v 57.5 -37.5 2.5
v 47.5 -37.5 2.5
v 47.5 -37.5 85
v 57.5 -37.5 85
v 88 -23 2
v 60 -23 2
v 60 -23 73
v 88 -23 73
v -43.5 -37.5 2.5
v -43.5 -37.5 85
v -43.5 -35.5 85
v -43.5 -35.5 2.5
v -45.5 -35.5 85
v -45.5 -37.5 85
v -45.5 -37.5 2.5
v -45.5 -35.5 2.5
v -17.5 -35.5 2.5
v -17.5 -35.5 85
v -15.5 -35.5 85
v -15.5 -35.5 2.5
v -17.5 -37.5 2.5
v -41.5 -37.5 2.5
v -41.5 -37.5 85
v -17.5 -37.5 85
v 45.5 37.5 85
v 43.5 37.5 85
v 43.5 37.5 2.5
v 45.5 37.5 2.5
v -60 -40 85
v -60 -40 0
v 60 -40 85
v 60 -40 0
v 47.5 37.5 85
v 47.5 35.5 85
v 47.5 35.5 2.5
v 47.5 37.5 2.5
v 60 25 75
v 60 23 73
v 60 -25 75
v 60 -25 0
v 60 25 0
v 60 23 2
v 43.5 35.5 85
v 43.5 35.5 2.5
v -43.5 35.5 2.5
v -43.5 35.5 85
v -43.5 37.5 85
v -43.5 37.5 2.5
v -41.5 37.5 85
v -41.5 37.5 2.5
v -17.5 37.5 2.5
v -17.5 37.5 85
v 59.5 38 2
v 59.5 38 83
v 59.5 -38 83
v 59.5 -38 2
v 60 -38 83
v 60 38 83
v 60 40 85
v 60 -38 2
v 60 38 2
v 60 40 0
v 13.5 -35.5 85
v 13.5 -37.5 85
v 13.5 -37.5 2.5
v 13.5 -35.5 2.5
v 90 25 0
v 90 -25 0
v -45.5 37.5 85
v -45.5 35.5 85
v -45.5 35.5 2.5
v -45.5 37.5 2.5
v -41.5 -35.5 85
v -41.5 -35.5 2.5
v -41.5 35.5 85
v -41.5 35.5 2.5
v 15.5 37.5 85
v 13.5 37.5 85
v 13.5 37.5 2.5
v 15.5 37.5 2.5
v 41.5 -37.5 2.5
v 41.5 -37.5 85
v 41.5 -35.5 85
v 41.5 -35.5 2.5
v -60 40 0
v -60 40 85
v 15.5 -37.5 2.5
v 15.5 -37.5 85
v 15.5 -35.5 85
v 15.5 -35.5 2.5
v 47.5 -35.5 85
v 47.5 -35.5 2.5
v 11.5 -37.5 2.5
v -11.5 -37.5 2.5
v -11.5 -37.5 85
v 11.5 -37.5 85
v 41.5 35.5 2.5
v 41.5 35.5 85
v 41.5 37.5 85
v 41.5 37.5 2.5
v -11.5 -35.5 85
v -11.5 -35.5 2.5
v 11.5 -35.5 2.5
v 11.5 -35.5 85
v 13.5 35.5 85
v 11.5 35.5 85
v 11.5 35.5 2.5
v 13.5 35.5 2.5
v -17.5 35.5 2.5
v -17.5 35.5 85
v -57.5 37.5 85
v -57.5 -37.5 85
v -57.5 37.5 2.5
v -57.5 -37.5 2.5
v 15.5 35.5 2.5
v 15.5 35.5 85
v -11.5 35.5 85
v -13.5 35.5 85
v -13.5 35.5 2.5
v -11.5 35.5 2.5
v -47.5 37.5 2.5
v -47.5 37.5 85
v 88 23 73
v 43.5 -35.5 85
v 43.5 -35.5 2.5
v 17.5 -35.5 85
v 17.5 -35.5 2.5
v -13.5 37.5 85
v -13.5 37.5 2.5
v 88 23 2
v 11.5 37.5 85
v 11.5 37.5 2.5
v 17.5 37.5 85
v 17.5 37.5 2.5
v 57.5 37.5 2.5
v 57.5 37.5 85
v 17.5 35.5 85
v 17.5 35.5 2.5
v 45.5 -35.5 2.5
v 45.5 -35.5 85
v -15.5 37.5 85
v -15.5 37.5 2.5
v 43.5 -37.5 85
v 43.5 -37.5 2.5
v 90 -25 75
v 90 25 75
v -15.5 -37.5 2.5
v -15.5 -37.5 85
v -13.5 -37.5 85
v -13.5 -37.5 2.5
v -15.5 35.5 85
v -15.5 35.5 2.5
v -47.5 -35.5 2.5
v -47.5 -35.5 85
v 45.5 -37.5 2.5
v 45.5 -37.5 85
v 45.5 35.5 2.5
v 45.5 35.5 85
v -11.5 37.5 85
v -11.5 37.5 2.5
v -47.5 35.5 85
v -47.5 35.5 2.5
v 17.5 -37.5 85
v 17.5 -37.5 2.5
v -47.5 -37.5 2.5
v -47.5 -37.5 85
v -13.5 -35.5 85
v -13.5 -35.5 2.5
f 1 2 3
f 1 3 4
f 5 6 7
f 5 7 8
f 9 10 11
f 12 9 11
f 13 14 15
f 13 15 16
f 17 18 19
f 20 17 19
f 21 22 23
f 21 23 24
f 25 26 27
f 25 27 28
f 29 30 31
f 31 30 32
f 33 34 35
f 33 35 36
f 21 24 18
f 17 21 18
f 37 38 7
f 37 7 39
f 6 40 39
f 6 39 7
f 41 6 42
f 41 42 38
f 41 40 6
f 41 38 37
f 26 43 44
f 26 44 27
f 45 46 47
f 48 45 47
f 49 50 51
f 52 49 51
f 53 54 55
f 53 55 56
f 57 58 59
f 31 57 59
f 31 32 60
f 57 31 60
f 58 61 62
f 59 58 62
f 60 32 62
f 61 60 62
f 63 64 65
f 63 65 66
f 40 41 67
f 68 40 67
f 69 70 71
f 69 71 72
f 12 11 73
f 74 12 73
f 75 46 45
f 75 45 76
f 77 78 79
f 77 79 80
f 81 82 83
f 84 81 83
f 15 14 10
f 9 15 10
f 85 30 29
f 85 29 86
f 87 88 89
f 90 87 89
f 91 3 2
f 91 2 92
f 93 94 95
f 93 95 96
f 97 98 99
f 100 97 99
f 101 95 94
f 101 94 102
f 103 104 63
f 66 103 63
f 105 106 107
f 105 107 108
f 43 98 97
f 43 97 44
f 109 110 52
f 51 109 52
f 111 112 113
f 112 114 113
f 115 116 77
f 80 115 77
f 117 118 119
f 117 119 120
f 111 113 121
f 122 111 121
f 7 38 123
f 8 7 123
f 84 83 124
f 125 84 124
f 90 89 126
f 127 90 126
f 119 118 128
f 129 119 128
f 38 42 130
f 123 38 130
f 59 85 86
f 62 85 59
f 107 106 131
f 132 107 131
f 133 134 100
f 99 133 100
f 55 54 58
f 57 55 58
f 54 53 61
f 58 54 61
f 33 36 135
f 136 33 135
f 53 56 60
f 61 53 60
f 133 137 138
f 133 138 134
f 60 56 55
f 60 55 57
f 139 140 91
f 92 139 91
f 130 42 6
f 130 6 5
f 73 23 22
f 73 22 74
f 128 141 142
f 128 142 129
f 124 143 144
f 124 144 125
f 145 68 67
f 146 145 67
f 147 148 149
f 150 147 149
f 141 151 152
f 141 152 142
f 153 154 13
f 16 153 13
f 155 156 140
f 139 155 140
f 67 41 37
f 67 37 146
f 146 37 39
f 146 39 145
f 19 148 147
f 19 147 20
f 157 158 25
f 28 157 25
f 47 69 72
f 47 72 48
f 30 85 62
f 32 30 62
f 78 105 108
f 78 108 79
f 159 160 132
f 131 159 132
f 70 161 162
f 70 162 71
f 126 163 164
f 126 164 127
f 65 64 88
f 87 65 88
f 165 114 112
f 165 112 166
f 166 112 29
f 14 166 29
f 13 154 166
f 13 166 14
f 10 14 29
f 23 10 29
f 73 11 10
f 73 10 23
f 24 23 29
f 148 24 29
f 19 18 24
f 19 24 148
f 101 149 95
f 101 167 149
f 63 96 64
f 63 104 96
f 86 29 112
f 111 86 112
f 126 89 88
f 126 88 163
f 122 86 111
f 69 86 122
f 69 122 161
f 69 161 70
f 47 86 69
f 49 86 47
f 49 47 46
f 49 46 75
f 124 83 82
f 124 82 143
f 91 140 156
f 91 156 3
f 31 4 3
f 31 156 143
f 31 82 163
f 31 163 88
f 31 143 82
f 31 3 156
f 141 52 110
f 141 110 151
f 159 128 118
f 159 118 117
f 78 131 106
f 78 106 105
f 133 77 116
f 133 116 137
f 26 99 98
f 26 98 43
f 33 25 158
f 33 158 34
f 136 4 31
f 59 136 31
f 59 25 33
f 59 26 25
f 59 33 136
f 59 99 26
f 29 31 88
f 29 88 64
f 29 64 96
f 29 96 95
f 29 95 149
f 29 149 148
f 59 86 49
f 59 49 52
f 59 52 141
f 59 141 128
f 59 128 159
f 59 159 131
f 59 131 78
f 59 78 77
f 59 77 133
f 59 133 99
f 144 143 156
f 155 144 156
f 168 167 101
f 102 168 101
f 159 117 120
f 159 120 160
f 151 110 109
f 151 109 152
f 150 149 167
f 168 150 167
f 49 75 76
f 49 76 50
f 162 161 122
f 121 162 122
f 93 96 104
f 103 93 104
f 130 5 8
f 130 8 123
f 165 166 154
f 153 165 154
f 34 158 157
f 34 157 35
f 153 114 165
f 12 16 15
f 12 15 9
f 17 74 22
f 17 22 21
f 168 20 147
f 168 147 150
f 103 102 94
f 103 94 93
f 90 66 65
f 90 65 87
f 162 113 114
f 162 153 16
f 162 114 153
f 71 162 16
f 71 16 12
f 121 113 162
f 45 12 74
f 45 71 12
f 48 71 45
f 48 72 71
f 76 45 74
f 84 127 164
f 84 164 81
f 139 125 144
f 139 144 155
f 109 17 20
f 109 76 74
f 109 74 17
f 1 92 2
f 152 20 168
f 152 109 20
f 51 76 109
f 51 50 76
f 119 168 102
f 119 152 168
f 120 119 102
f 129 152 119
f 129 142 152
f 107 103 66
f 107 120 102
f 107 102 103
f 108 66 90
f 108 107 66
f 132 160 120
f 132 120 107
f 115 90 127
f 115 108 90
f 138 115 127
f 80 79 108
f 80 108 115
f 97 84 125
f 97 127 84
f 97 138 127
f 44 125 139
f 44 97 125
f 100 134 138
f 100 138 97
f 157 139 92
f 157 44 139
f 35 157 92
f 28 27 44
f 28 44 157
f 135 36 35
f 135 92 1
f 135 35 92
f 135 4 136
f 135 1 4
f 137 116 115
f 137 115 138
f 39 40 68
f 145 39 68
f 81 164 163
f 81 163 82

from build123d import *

# Parameters (mm, degrees)
F0_W           = 120
F0_H           = 80
F1_DEPTH       = 85
F2_T           = -2.5
F3_W           = 2
F3_H           = 2
F4_DEPTH       = 85
F5_W           = 30
F5_H           = 50
F6_DEPTH       = 75
F7_T           = -2
F7_2_T         = 2
F7_2_T3_DEPTH  = 86.5
F7_2_T5_DEPTH  = 14
F7_2_T7_DEPTH  = 6
F7_2_T9_DEPTH  = 28
F7_2_T11_DEPTH = 6
F7_2_T13_DEPTH = 27
F7_2_T15_DEPTH = 6
F7_2_T17_DEPTH = 28
F7_2_T19_DEPTH = 6
F7_2_T21_DEPTH = 14
F7_2_T23_DEPTH = 79
F7_2_T25_DEPTH = 6
F7_2_T27_DEPTH = 6
F7_2_T29_DEPTH = 6
F7_2_T31_DEPTH = 6
F7_2_T33_DEPTH = 6
F7_2_T35_DEPTH = 6
F7_2_T37_DEPTH = 6
F7_2_T39_DEPTH = 6
F7_2_T41_DEPTH = 6
F7_2_T43_DEPTH = 6


# Not quite as in the source:
# - a shell that OpenCascade refuses in one call is made with other operations: the cavity is built on its own and cut out


with BuildPart() as f1:
    # F0 (on Top) → F1 (new body)
    with BuildSketch(Plane.XY):
        Rectangle(F0_W, F0_H)
    extrude(amount=F1_DEPTH)

    # F2
    f2_openings = [f1.faces().sort_by_distance(p)[0] for p in [
        (0, 0, 85),
    ]]
    offset(amount=F2_T, openings=f2_openings)

    # F3 (on Top) → F4 (join)
    with BuildSketch(Plane.XY):
        with Locations((-46.5, -36.5)):
            Rectangle(F3_W, F3_H)
        with Locations((-42.5, -36.5)):
            Rectangle(F3_W, F3_H)
        with Locations((-16.5, -36.5)):
            Rectangle(F3_W, F3_H)
        with Locations((-12.5, -36.5)):
            Rectangle(F3_W, F3_H)
        with Locations((42.5, -36.5)):
            Rectangle(F3_W, F3_H)
        with Locations((46.5, -36.5)):
            Rectangle(F3_W, F3_H)
        with Locations((12.5, -36.5)):
            Rectangle(F3_W, F3_H)
        with Locations((16.5, -36.5)):
            Rectangle(F3_W, F3_H)
        with Locations((-46.5, 36.5)):
            Rectangle(F3_W, F3_H)
        with Locations((42.5, 36.5)):
            Rectangle(F3_W, F3_H)
        with Locations((-16.5, 36.5)):
            Rectangle(F3_W, F3_H)
        with Locations((-42.5, 36.5)):
            Rectangle(F3_W, F3_H)
        with Locations((-12.5, 36.5)):
            Rectangle(F3_W, F3_H)
        with Locations((46.5, 36.5)):
            Rectangle(F3_W, F3_H)
        with Locations((16.5, 36.5)):
            Rectangle(F3_W, F3_H)
        with Locations((12.5, 36.5)):
            Rectangle(F3_W, F3_H)
    extrude(amount=F4_DEPTH)

    # F7#2: shell of thickness 2, made by hand


with BuildPart() as f6:
    # F5 (on Top) → F6 (new body)
    with BuildSketch(Plane.XY):
        with Locations((75, 0)):
            Rectangle(F5_W, F5_H)
    extrude(amount=F6_DEPTH)

    # F7
    f7_openings = [f6.faces().sort_by_distance(p)[0] for p in [
        (60, 0, 37.5),
    ]]
    offset(amount=F7_T, openings=f7_openings)


with BuildPart() as f7_2_core1:
    # F7_2_t2: copy of F1
    add(f1.part)

    # the walls: a layer under each face that stays
    f7_2_faces = [f7_2_core1.faces().sort_by_distance(p)[0] for p in [
        (0, -40, 42.5),
        (-60, 0, 42.5),
        (0, 0, 0),
        (-16, -37.3333333333, 85),
        (0, 40, 42.5),
        (-52.5, -37.5, 43.75),
        (-44.5, -37.5, 43.75),
        (-29.5, -37.5, 43.75),
        (-14.5, -37.5, 43.75),
        (0, -37.5, 43.75),
        (14.5, -37.5, 43.75),
        (29.5, -37.5, 43.75),
        (44.5, -37.5, 43.75),
        (52.5, -37.5, 43.75),
        (-57.5, 0, 43.75),
        (52.5, 37.5, 43.75),
        (44.5, 37.5, 43.75),
        (29.5, 37.5, 43.75),
        (14.5, 37.5, 43.75),
        (0, 37.5, 43.75),
        (-14.5, 37.5, 43.75),
        (-29.5, 37.5, 43.75),
        (-44.5, 37.5, 43.75),
        (-52.5, 37.5, 43.75),
        (57.5, 0, 43.75),
        (0, 0, 2.5),
        (-47.5, -36.5, 43.75),
        (-45.5, -36.5, 43.75),
        (-46.5, -35.5, 43.75),
        (-43.5, -36.5, 43.75),
        (-41.5, -36.5, 43.75),
        (-42.5, -35.5, 43.75),
        (-17.5, -36.5, 43.75),
        (-15.5, -36.5, 43.75),
        (-16.5, -35.5, 43.75),
        (-13.5, -36.5, 43.75),
        (-11.5, -36.5, 43.75),
        (-12.5, -35.5, 43.75),
        (11.5, -36.5, 43.75),
        (12.5, -35.5, 43.75),
        (13.5, -36.5, 43.75),
        (15.5, -36.5, 43.75),
        (17.5, -36.5, 43.75),
        (16.5, -35.5, 43.75),
        (41.5, -36.5, 43.75),
        (43.5, -36.5, 43.75),
        (42.5, -35.5, 43.75),
        (45.5, -36.5, 43.75),
        (47.5, -36.5, 43.75),
        (46.5, -35.5, 43.75),
        (47.5, 36.5, 43.75),
        (46.5, 35.5, 43.75),
        (45.5, 36.5, 43.75),
        (43.5, 36.5, 43.75),
        (42.5, 35.5, 43.75),
        (41.5, 36.5, 43.75),
        (17.5, 36.5, 43.75),
        (15.5, 36.5, 43.75),
        (16.5, 35.5, 43.75),
        (13.5, 36.5, 43.75),
        (11.5, 36.5, 43.75),
        (12.5, 35.5, 43.75),
        (-11.5, 36.5, 43.75),
        (-13.5, 36.5, 43.75),
        (-12.5, 35.5, 43.75),
        (-15.5, 36.5, 43.75),
        (-17.5, 36.5, 43.75),
        (-16.5, 35.5, 43.75),
        (-41.5, 36.5, 43.75),
        (-43.5, 36.5, 43.75),
        (-42.5, 35.5, 43.75),
        (-45.5, 36.5, 43.75),
        (-46.5, 35.5, 43.75),
        (-47.5, 36.5, 43.75),
    ]]
    thicken(f7_2_faces, amount=-F7_2_T, mode=Mode.SUBTRACT)

    # F7_2_s4 → F7_2_t3 (cut)
    with BuildSketch(Plane.XY.offset(0.5)):
        Polygon((-57.48, -37.48), (-57.5, -39.5), (-59.5, -39.5), (-59.5, -37.5), align=None)
        Polygon((-47.52, -37.48), (-47.5, -39.5), (-45.5, -39.5), (-45.5, -37.5), align=None)
        Polygon((-45.48, -37.48), (-45.5, -39.5), (-47.5, -39.5), (-47.5, -37.5), align=None)
        Polygon((-43.52, -37.48), (-43.5, -39.5), (-41.5, -39.5), (-41.5, -37.5), align=None)
        Polygon((-41.48, -37.48), (-41.5, -39.5), (-43.5, -39.5), (-43.5, -37.5), align=None)
        Polygon((-17.52, -37.48), (-17.5, -39.5), (-15.5, -39.5), (-15.5, -37.5), align=None)
        Polygon((-15.48, -37.48), (-15.5, -39.5), (-17.5, -39.5), (-17.5, -37.5), align=None)
        Polygon((-13.52, -37.48), (-13.5, -39.5), (-11.5, -39.5), (-11.5, -37.5), align=None)
        Polygon((-11.48, -37.48), (-11.5, -39.5), (-13.5, -39.5), (-13.5, -37.5), align=None)
        Polygon((11.48, -37.48), (11.5, -39.5), (13.5, -39.5), (13.5, -37.5), align=None)
        Polygon((13.52, -37.48), (13.5, -39.5), (11.5, -39.5), (11.5, -37.5), align=None)
        Polygon((15.48, -37.48), (15.5, -39.5), (17.5, -39.5), (17.5, -37.5), align=None)
        Polygon((17.52, -37.48), (17.5, -39.5), (15.5, -39.5), (15.5, -37.5), align=None)
        Polygon((41.48, -37.48), (41.5, -39.5), (43.5, -39.5), (43.5, -37.5), align=None)
        Polygon((43.52, -37.48), (43.5, -39.5), (41.5, -39.5), (41.5, -37.5), align=None)
        Polygon((45.48, -37.48), (45.5, -39.5), (47.5, -39.5), (47.5, -37.5), align=None)
        Polygon((47.52, -37.48), (47.5, -39.5), (45.5, -39.5), (45.5, -37.5), align=None)
        Polygon((57.48, -37.48), (57.5, -39.5), (59.5, -39.5), (59.5, -37.5), align=None)
        Polygon((-57.48, 37.48), (-59.5, 37.5), (-59.5, 39.5), (-57.5, 39.5), align=None)
        Polygon((57.48, 37.48), (57.5, 39.5), (59.5, 39.5), (59.5, 37.5), align=None)
        Polygon((47.52, 37.48), (47.5, 39.5), (45.5, 39.5), (45.5, 37.5), align=None)
        Polygon((45.48, 37.48), (45.5, 39.5), (47.5, 39.5), (47.5, 37.5), align=None)
        Polygon((43.52, 37.48), (43.5, 39.5), (41.5, 39.5), (41.5, 37.5), align=None)
        Polygon((41.48, 37.48), (41.5, 39.5), (43.5, 39.5), (43.5, 37.5), align=None)
        Polygon((17.52, 37.48), (17.5, 39.5), (15.5, 39.5), (15.5, 37.5), align=None)
        Polygon((15.48, 37.48), (15.5, 39.5), (17.5, 39.5), (17.5, 37.5), align=None)
        Polygon((13.52, 37.48), (13.5, 39.5), (11.5, 39.5), (11.5, 37.5), align=None)
        Polygon((11.48, 37.48), (11.5, 39.5), (13.5, 39.5), (13.5, 37.5), align=None)
        Polygon((-11.48, 37.48), (-11.5, 39.5), (-13.5, 39.5), (-13.5, 37.5), align=None)
        Polygon((-13.52, 37.48), (-13.5, 39.5), (-11.5, 39.5), (-11.5, 37.5), align=None)
        Polygon((-15.48, 37.48), (-15.5, 39.5), (-17.5, 39.5), (-17.5, 37.5), align=None)
        Polygon((-17.52, 37.48), (-17.5, 39.5), (-15.5, 39.5), (-15.5, 37.5), align=None)
        Polygon((-41.48, 37.48), (-41.5, 39.5), (-43.5, 39.5), (-43.5, 37.5), align=None)
        Polygon((-43.52, 37.48), (-43.5, 39.5), (-41.5, 39.5), (-41.5, 37.5), align=None)
        Polygon((-45.48, 37.48), (-45.5, 39.5), (-47.5, 39.5), (-47.5, 37.5), align=None)
        Polygon((-47.52, 37.48), (-47.5, 39.5), (-45.5, 39.5), (-45.5, 37.5), align=None)
    extrude(amount=F7_2_T3_DEPTH, mode=Mode.SUBTRACT)

    # F7_2_s6 → F7_2_t5 (cut)
    with BuildSketch(Plane.YZ.offset(-59.5)):
        Polygon((-37.48, 2.52), (-39.5, 2.5), (-39.5, 0.5), (-37.5, 0.5), align=None)
        Polygon((37.48, 2.52), (39.5, 2.5), (39.5, 0.5), (37.5, 0.5), align=None)
    extrude(amount=F7_2_T5_DEPTH, mode=Mode.SUBTRACT)

    # F7_2_s8 → F7_2_t7 (cut)
    with BuildSketch(Plane.YZ.offset(-47.5)):
        Polygon((-37.48, 2.52), (-39.5, 2.5), (-39.5, 0.5), (-37.5, 0.5), align=None)
        Polygon((37.48, 2.52), (39.5, 2.5), (39.5, 0.5), (37.5, 0.5), align=None)
    extrude(amount=F7_2_T7_DEPTH, mode=Mode.SUBTRACT)

    # F7_2_s10 → F7_2_t9 (cut)
    with BuildSketch(Plane.YZ.offset(-43.5)):
        Polygon((-37.48, 2.52), (-39.5, 2.5), (-39.5, 0.5), (-37.5, 0.5), align=None)
        Polygon((37.48, 2.52), (39.5, 2.5), (39.5, 0.5), (37.5, 0.5), align=None)
    extrude(amount=F7_2_T9_DEPTH, mode=Mode.SUBTRACT)

    # F7_2_s12 → F7_2_t11 (cut)
    with BuildSketch(Plane.YZ.offset(-17.5)):
        Polygon((-37.48, 2.52), (-39.5, 2.5), (-39.5, 0.5), (-37.5, 0.5), align=None)
        Polygon((37.48, 2.52), (39.5, 2.5), (39.5, 0.5), (37.5, 0.5), align=None)
    extrude(amount=F7_2_T11_DEPTH, mode=Mode.SUBTRACT)

    # F7_2_s14 → F7_2_t13 (cut)
    with BuildSketch(Plane.YZ.offset(-13.5)):
        Polygon((-37.48, 2.52), (-39.5, 2.5), (-39.5, 0.5), (-37.5, 0.5), align=None)
        Polygon((37.48, 2.52), (39.5, 2.5), (39.5, 0.5), (37.5, 0.5), align=None)
    extrude(amount=F7_2_T13_DEPTH, mode=Mode.SUBTRACT)

    # F7_2_s16 → F7_2_t15 (cut)
    with BuildSketch(Plane.YZ.offset(11.5)):
        Polygon((-37.48, 2.52), (-39.5, 2.5), (-39.5, 0.5), (-37.5, 0.5), align=None)
        Polygon((37.48, 2.52), (39.5, 2.5), (39.5, 0.5), (37.5, 0.5), align=None)
    extrude(amount=F7_2_T15_DEPTH, mode=Mode.SUBTRACT)

    # F7_2_s18 → F7_2_t17 (cut)
    with BuildSketch(Plane.YZ.offset(15.5)):
        Polygon((-37.48, 2.52), (-39.5, 2.5), (-39.5, 0.5), (-37.5, 0.5), align=None)
        Polygon((37.48, 2.52), (39.5, 2.5), (39.5, 0.5), (37.5, 0.5), align=None)
    extrude(amount=F7_2_T17_DEPTH, mode=Mode.SUBTRACT)

    # F7_2_s20 → F7_2_t19 (cut)
    with BuildSketch(Plane.YZ.offset(41.5)):
        Polygon((-37.48, 2.52), (-39.5, 2.5), (-39.5, 0.5), (-37.5, 0.5), align=None)
        Polygon((37.48, 2.52), (39.5, 2.5), (39.5, 0.5), (37.5, 0.5), align=None)
    extrude(amount=F7_2_T19_DEPTH, mode=Mode.SUBTRACT)

    # F7_2_s22 → F7_2_t21 (cut)
    with BuildSketch(Plane.YZ.offset(45.5)):
        Polygon((-37.48, 2.52), (-39.5, 2.5), (-39.5, 0.5), (-37.5, 0.5), align=None)
        Polygon((37.48, 2.52), (39.5, 2.5), (39.5, 0.5), (37.5, 0.5), align=None)
    extrude(amount=F7_2_T21_DEPTH, mode=Mode.SUBTRACT)

    # F7_2_s24 → F7_2_t23 (cut)
    with BuildSketch(Plane.XZ.offset(-39.5)):
        Polygon((-57.48, 2.52), (-59.5, 2.5), (-59.5, 0.5), (-57.5, 0.5), align=None)
        Polygon((57.48, 2.52), (59.5, 2.5), (59.5, 0.5), (57.5, 0.5), align=None)
    extrude(amount=F7_2_T23_DEPTH, mode=Mode.SUBTRACT)

    # F7_2_s26 → F7_2_t25 (cut)
    with BuildSketch(Plane.XZ.offset(-39.5)):
        Polygon((-47.52, 2.52), (-47.5, 0.5), (-45.5, 0.5), (-45.5, 2.5), align=None)
        Polygon((-45.48, 2.52), (-45.5, 0.5), (-47.5, 0.5), (-47.5, 2.5), align=None)
        Polygon((-43.52, 2.52), (-43.5, 0.5), (-41.5, 0.5), (-41.5, 2.5), align=None)
        Polygon((-41.48, 2.52), (-41.5, 0.5), (-43.5, 0.5), (-43.5, 2.5), align=None)
        Polygon((-17.52, 2.52), (-17.5, 0.5), (-15.5, 0.5), (-15.5, 2.5), align=None)
        Polygon((-15.48, 2.52), (-15.5, 0.5), (-17.5, 0.5), (-17.5, 2.5), align=None)
        Polygon((-13.52, 2.52), (-13.5, 0.5), (-11.5, 0.5), (-11.5, 2.5), align=None)
        Polygon((-11.48, 2.52), (-11.5, 0.5), (-13.5, 0.5), (-13.5, 2.5), align=None)
        Polygon((11.48, 2.52), (11.5, 0.5), (13.5, 0.5), (13.5, 2.5), align=None)
        Polygon((13.52, 2.52), (13.5, 0.5), (11.5, 0.5), (11.5, 2.5), align=None)
        Polygon((15.48, 2.52), (15.5, 0.5), (17.5, 0.5), (17.5, 2.5), align=None)
        Polygon((17.52, 2.52), (17.5, 0.5), (15.5, 0.5), (15.5, 2.5), align=None)
        Polygon((41.48, 2.52), (41.5, 0.5), (43.5, 0.5), (43.5, 2.5), align=None)
        Polygon((43.52, 2.52), (43.5, 0.5), (41.5, 0.5), (41.5, 2.5), align=None)
        Polygon((45.48, 2.52), (45.5, 0.5), (47.5, 0.5), (47.5, 2.5), align=None)
        Polygon((47.52, 2.52), (47.5, 0.5), (45.5, 0.5), (45.5, 2.5), align=None)
    extrude(amount=F7_2_T25_DEPTH, mode=Mode.SUBTRACT)

    # F7_2_s28 → F7_2_t27 (cut)
    with BuildSketch(Plane.YZ.offset(-49.5)):
        Polygon((35.48, 2.52), (35.5, 0.5), (37.5, 0.5), (37.5, 2.5), align=None)
        Polygon((-35.48, 2.52), (-35.5, 0.5), (-37.5, 0.5), (-37.5, 2.5), align=None)
    extrude(amount=F7_2_T27_DEPTH, mode=Mode.SUBTRACT)

    # F7_2_s30 → F7_2_t29 (cut)
    with BuildSketch(Plane.YZ.offset(-45.5)):
        Polygon((35.48, 2.52), (35.5, 0.5), (37.5, 0.5), (37.5, 2.5), align=None)
        Polygon((-35.48, 2.52), (-35.5, 0.5), (-37.5, 0.5), (-37.5, 2.5), align=None)
    extrude(amount=F7_2_T29_DEPTH, mode=Mode.SUBTRACT)

    # F7_2_s32 → F7_2_t31 (cut)
    with BuildSketch(Plane.YZ.offset(-19.5)):
        Polygon((35.48, 2.52), (35.5, 0.5), (37.5, 0.5), (37.5, 2.5), align=None)
        Polygon((-35.48, 2.52), (-35.5, 0.5), (-37.5, 0.5), (-37.5, 2.5), align=None)
    extrude(amount=F7_2_T31_DEPTH, mode=Mode.SUBTRACT)

    # F7_2_s34 → F7_2_t33 (cut)
    with BuildSketch(Plane.YZ.offset(-15.5)):
        Polygon((35.48, 2.52), (35.5, 0.5), (37.5, 0.5), (37.5, 2.5), align=None)
        Polygon((-35.48, 2.52), (-35.5, 0.5), (-37.5, 0.5), (-37.5, 2.5), align=None)
    extrude(amount=F7_2_T33_DEPTH, mode=Mode.SUBTRACT)

    # F7_2_s36 → F7_2_t35 (cut)
    with BuildSketch(Plane.YZ.offset(9.5)):
        Polygon((35.48, 2.52), (35.5, 0.5), (37.5, 0.5), (37.5, 2.5), align=None)
        Polygon((-35.48, 2.52), (-35.5, 0.5), (-37.5, 0.5), (-37.5, 2.5), align=None)
    extrude(amount=F7_2_T35_DEPTH, mode=Mode.SUBTRACT)

    # F7_2_s38 → F7_2_t37 (cut)
    with BuildSketch(Plane.YZ.offset(13.5)):
        Polygon((35.48, 2.52), (35.5, 0.5), (37.5, 0.5), (37.5, 2.5), align=None)
        Polygon((-35.48, 2.52), (-35.5, 0.5), (-37.5, 0.5), (-37.5, 2.5), align=None)
    extrude(amount=F7_2_T37_DEPTH, mode=Mode.SUBTRACT)

    # F7_2_s40 → F7_2_t39 (cut)
    with BuildSketch(Plane.YZ.offset(39.5)):
        Polygon((35.48, 2.52), (35.5, 0.5), (37.5, 0.5), (37.5, 2.5), align=None)
        Polygon((-35.48, 2.52), (-35.5, 0.5), (-37.5, 0.5), (-37.5, 2.5), align=None)
    extrude(amount=F7_2_T39_DEPTH, mode=Mode.SUBTRACT)

    # F7_2_s42 → F7_2_t41 (cut)
    with BuildSketch(Plane.YZ.offset(43.5)):
        Polygon((35.48, 2.52), (35.5, 0.5), (37.5, 0.5), (37.5, 2.5), align=None)
        Polygon((-35.48, 2.52), (-35.5, 0.5), (-37.5, 0.5), (-37.5, 2.5), align=None)
    extrude(amount=F7_2_T41_DEPTH, mode=Mode.SUBTRACT)

    # F7_2_s44 → F7_2_t43 (cut)
    with BuildSketch(Plane.XZ.offset(33.5)):
        Polygon((47.52, 2.52), (47.5, 0.5), (45.5, 0.5), (45.5, 2.5), align=None)
        Polygon((45.48, 2.52), (45.5, 0.5), (47.5, 0.5), (47.5, 2.5), align=None)
        Polygon((43.52, 2.52), (43.5, 0.5), (41.5, 0.5), (41.5, 2.5), align=None)
        Polygon((41.48, 2.52), (41.5, 0.5), (43.5, 0.5), (43.5, 2.5), align=None)
        Polygon((17.52, 2.52), (17.5, 0.5), (15.5, 0.5), (15.5, 2.5), align=None)
        Polygon((15.48, 2.52), (15.5, 0.5), (17.5, 0.5), (17.5, 2.5), align=None)
        Polygon((13.52, 2.52), (13.5, 0.5), (11.5, 0.5), (11.5, 2.5), align=None)
        Polygon((11.48, 2.52), (11.5, 0.5), (13.5, 0.5), (13.5, 2.5), align=None)
        Polygon((-11.48, 2.52), (-11.5, 0.5), (-13.5, 0.5), (-13.5, 2.5), align=None)
        Polygon((-13.52, 2.52), (-13.5, 0.5), (-11.5, 0.5), (-11.5, 2.5), align=None)
        Polygon((-15.48, 2.52), (-15.5, 0.5), (-17.5, 0.5), (-17.5, 2.5), align=None)
        Polygon((-17.52, 2.52), (-17.5, 0.5), (-15.5, 0.5), (-15.5, 2.5), align=None)
        Polygon((-41.48, 2.52), (-41.5, 0.5), (-43.5, 0.5), (-43.5, 2.5), align=None)
        Polygon((-43.52, 2.52), (-43.5, 0.5), (-41.5, 0.5), (-41.5, 2.5), align=None)
        Polygon((-45.48, 2.52), (-45.5, 0.5), (-47.5, 0.5), (-47.5, 2.5), align=None)
        Polygon((-47.52, 2.52), (-47.5, 0.5), (-45.5, 0.5), (-45.5, 2.5), align=None)
    extrude(amount=F7_2_T43_DEPTH, mode=Mode.SUBTRACT)


with BuildPart() as f1_1:
    add(f1.part)

    # what is left inside the walls is the cavity
    f7_2_cavity = [f7_2_core1.part.solids().sort_by_distance(p)[0] for p in [
        (59.98, 0, 56),
    ]]
    add(f7_2_cavity, mode=Mode.SUBTRACT)


solid = Compound([f6.part, f1_1.part])
